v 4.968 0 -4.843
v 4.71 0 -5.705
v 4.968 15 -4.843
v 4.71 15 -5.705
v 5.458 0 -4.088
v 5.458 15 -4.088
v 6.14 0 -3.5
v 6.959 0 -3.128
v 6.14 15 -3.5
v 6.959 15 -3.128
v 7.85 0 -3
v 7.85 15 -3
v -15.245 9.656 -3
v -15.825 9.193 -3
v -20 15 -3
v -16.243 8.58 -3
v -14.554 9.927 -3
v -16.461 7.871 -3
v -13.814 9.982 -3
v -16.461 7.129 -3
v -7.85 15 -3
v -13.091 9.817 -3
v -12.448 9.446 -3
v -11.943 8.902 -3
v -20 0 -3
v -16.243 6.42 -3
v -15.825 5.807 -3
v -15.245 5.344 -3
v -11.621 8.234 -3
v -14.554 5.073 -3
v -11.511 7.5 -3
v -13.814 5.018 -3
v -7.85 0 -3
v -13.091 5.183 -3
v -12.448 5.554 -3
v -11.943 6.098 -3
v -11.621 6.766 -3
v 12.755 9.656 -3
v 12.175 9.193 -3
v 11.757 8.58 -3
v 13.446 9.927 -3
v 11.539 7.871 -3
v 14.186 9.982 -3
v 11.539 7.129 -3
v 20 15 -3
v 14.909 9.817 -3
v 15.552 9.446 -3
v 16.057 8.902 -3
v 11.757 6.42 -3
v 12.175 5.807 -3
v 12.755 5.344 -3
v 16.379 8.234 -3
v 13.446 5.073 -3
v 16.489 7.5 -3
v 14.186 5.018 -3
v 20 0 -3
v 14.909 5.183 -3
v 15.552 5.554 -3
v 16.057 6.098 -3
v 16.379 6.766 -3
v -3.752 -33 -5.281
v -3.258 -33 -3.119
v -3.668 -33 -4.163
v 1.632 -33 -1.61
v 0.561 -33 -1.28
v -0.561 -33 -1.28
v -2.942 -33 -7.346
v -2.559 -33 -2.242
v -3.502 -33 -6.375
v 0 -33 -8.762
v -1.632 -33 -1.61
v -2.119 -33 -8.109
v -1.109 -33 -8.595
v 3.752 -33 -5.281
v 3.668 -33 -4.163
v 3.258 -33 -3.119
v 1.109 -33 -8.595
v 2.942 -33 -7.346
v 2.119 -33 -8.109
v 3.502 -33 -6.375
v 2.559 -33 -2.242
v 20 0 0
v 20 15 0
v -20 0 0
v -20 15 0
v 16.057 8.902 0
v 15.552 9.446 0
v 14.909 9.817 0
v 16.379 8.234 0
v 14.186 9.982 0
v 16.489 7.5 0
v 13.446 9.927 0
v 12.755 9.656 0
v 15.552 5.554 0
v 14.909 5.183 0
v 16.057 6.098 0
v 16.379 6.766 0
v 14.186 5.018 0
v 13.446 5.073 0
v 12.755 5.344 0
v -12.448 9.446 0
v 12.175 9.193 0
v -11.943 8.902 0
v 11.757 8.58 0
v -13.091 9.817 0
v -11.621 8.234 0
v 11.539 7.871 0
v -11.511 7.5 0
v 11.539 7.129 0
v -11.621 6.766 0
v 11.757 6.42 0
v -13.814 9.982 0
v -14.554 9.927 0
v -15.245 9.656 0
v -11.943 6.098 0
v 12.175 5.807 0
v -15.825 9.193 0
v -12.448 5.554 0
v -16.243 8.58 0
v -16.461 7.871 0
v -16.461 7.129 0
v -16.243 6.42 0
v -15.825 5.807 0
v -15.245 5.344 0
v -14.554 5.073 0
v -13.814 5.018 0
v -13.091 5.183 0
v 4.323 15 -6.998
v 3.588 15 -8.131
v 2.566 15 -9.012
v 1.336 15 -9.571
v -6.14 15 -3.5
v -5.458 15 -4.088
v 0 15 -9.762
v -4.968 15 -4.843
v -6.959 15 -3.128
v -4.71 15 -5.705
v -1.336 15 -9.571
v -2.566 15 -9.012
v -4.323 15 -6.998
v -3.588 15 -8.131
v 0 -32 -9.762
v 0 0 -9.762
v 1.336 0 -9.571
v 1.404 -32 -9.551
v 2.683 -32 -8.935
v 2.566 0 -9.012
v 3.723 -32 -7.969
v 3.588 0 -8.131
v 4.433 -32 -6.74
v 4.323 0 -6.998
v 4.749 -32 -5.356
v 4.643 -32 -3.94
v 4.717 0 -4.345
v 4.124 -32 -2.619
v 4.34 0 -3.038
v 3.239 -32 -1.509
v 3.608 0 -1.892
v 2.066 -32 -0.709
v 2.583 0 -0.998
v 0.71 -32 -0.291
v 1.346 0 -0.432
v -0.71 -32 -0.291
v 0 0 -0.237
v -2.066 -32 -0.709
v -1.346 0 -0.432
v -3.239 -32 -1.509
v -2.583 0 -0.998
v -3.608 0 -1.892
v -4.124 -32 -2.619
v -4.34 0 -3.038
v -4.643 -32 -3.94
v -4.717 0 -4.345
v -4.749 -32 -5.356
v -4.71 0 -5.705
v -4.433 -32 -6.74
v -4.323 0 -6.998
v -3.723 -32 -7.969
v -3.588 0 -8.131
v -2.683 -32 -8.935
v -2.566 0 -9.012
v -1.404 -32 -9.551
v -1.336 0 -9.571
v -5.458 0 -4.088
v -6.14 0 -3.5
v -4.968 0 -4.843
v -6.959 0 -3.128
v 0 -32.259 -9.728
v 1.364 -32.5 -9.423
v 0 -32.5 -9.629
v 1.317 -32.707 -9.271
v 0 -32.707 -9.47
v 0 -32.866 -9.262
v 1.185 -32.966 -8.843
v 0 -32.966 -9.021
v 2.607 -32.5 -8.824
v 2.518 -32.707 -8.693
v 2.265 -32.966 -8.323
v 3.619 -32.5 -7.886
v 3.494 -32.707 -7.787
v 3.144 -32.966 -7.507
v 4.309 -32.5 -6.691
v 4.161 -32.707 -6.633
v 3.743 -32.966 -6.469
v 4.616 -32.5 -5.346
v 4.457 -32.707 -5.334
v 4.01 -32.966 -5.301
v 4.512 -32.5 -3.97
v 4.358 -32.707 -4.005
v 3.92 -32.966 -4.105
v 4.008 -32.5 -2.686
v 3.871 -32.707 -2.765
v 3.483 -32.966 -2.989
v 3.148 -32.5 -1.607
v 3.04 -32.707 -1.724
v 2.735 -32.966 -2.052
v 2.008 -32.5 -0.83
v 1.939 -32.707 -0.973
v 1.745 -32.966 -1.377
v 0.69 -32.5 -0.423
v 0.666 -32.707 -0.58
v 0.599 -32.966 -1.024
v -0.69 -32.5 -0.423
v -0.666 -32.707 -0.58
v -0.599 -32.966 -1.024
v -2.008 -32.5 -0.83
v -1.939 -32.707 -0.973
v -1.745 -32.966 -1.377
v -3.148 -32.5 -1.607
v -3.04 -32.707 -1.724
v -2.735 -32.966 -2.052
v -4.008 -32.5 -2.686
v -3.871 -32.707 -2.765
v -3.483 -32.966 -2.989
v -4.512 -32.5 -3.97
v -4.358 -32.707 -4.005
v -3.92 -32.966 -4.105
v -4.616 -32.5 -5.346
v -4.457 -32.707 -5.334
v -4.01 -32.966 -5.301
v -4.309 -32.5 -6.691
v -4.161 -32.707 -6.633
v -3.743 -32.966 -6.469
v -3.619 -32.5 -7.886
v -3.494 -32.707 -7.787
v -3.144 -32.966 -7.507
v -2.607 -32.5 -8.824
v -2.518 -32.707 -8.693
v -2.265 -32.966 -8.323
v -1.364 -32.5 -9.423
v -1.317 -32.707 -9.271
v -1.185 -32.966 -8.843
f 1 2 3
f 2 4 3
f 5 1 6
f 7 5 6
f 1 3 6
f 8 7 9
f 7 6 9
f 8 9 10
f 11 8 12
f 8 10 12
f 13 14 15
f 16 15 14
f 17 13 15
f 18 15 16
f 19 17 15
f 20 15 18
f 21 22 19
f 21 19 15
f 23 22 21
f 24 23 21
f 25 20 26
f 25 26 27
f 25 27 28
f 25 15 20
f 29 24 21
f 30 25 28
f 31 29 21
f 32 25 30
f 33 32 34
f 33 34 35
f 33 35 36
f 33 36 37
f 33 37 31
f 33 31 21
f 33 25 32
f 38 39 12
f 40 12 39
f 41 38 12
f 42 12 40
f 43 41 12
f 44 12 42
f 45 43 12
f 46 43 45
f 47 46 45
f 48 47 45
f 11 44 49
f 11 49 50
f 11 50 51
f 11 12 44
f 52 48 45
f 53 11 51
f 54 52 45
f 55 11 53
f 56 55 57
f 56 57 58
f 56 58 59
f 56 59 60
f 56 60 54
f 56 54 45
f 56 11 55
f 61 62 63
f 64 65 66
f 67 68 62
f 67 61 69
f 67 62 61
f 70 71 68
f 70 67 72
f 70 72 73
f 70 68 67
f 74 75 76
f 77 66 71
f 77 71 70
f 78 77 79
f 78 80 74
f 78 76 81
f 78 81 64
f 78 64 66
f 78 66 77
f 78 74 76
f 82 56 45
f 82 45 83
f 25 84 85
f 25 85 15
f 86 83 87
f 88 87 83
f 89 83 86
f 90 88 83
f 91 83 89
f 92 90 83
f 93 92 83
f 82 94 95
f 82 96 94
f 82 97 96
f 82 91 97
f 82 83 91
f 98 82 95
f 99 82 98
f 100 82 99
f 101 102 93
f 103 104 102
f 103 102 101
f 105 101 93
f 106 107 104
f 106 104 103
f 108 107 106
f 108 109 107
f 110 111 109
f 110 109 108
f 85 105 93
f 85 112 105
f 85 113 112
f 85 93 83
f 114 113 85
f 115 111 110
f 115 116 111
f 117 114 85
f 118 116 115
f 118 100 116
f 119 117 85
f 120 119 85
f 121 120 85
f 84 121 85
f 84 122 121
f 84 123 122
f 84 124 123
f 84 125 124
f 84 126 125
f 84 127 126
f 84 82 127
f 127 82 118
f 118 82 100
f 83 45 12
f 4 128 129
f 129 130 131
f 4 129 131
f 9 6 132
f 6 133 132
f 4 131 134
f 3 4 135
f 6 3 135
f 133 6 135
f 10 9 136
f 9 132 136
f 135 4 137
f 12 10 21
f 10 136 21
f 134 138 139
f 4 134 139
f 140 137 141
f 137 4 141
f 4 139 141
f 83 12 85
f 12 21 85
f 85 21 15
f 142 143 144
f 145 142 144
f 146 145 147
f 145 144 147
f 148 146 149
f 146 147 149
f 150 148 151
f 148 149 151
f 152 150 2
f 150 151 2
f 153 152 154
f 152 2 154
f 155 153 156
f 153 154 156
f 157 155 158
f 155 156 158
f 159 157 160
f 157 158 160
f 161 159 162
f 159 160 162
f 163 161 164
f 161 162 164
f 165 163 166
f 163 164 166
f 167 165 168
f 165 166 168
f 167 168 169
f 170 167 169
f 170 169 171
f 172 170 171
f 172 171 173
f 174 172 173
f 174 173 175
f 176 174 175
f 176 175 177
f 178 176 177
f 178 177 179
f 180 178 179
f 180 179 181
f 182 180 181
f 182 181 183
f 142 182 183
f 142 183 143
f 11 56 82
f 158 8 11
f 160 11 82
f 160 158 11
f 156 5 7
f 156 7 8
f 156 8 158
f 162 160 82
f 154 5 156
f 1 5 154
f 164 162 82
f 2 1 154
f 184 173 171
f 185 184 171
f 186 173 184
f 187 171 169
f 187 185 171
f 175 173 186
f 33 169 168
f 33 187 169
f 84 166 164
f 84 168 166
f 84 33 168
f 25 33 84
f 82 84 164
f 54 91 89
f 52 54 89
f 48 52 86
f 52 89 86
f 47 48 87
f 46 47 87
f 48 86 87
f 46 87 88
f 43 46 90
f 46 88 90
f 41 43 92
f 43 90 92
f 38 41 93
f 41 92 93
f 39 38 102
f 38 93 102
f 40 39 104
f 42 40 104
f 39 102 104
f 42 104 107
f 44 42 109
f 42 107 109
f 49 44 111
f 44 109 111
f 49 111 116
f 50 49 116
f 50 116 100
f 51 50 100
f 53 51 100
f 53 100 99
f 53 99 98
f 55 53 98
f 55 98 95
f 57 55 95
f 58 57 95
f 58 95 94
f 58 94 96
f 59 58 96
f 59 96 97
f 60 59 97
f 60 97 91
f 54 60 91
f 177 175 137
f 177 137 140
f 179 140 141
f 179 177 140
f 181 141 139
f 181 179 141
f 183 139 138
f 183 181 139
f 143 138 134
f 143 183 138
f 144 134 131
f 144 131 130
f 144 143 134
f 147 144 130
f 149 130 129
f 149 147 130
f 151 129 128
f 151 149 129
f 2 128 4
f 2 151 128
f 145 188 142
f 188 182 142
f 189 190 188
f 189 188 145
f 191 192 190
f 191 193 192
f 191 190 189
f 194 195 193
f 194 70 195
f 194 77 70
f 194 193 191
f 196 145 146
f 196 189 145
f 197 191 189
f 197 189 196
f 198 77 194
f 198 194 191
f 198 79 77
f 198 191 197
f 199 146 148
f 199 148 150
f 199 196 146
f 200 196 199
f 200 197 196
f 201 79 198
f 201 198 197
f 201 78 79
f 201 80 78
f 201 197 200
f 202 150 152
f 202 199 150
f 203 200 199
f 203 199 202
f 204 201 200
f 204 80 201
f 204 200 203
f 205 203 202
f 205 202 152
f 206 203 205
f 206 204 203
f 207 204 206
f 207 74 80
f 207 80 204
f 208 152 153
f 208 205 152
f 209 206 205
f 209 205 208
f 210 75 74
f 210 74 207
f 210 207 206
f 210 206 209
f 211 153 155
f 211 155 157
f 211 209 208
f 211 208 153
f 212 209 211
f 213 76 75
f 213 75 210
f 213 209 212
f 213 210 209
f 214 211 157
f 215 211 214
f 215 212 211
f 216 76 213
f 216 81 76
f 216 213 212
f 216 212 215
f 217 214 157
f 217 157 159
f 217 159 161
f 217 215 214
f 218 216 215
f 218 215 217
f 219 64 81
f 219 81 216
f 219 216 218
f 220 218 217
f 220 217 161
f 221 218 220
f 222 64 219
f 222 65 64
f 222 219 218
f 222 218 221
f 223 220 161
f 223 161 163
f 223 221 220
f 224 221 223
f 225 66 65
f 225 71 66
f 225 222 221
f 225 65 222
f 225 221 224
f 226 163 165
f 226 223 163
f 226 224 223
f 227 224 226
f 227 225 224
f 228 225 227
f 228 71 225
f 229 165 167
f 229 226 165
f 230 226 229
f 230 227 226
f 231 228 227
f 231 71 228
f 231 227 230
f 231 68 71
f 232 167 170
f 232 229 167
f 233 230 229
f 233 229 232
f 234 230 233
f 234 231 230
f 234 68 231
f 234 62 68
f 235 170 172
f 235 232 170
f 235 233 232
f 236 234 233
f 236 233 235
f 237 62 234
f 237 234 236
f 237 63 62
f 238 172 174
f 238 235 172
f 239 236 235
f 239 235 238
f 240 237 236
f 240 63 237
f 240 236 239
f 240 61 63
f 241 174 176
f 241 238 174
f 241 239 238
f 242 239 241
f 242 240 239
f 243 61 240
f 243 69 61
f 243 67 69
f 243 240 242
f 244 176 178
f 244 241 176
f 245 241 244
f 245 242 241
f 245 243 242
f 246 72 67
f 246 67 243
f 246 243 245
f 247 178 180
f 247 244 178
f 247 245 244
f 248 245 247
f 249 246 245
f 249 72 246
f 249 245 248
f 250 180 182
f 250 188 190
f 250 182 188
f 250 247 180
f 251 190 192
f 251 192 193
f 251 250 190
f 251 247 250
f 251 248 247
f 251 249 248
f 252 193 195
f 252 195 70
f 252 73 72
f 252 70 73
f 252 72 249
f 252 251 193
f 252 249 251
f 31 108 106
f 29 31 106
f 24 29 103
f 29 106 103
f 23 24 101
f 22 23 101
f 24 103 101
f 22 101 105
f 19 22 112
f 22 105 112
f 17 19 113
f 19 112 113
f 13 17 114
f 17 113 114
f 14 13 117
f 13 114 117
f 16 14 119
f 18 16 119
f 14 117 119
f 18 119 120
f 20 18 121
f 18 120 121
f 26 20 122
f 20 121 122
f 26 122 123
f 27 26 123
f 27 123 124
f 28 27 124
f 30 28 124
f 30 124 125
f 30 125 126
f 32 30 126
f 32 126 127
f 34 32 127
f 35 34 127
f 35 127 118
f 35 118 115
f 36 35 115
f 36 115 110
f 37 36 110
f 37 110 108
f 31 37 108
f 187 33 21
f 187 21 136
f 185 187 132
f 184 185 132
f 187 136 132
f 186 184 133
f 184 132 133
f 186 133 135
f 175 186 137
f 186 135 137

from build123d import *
from build123d.topology import SkipClean

# Parameters (mm, degrees)
BOSS_EXTRUDE1_DEPTH    = 15
FILLET1_R              = 3.175
SKETCH2_R              = 4.7625
BOSS_EXTRUDE2_DEPTH    = 33
FILLET2_R              = 1
F_10_CLEARANCE_HOLE1_D = 4.9784


with BuildPart() as part:
    # Sketch1 → Boss-Extrude1 (new body)
    with BuildSketch(Plane(origin=(0, 0, 0), x_dir=(1, 0, 0), z_dir=(0, 1, 0))):
        with BuildLine():
            Line((-20, 3), (-4.322199, 3))
            ThreePointArc((-4.322199, 3), (0, 9.7625), (4.322199, 3))
            Line((4.322199, 3), (20, 3))
            Line((20, 3), (20, 0))
            Line((20, 0), (-20, 0))
            Line((-20, 0), (-20, 3))
        make_face()
    extrude(amount=BOSS_EXTRUDE1_DEPTH)

    # Fillet1
    fillet1_edges = [part.edges().sort_by_distance(p)[0] for p in [
        (-4.322199, 7.5, -3),
        (4.322199, 7.5, -3),
    ]]
    fillet(fillet1_edges, radius=FILLET1_R)

    # Sketch2 → Boss-Extrude2 (add)
    with SkipClean():  # keep this step's faces unmerged: merging them makes the solid invalid here
        with BuildSketch(Plane.XZ):
            with Locations(Location((0, -5, 0), (0, 0, 270))):  # turned: the seam where the file's is
                Circle(SKETCH2_R)
        extrude(amount=BOSS_EXTRUDE2_DEPTH)

    # Fillet2
    fillet2_edges = [part.edges().sort_by_distance(p)[0] for p in [
        (0, -33, -0.2375),
    ]]
    fillet(fillet2_edges, radius=FILLET2_R)

    # #10 Clearance Hole1 (through all)
    with Locations(Plane(origin=(0, 0, -3), x_dir=(-1, 0, 0), z_dir=(0, 0, -1))):
        with Locations((14, 7.5), (-14, 7.5)):
            Hole(F_10_CLEARANCE_HOLE1_D / 2)


solid = part.part
